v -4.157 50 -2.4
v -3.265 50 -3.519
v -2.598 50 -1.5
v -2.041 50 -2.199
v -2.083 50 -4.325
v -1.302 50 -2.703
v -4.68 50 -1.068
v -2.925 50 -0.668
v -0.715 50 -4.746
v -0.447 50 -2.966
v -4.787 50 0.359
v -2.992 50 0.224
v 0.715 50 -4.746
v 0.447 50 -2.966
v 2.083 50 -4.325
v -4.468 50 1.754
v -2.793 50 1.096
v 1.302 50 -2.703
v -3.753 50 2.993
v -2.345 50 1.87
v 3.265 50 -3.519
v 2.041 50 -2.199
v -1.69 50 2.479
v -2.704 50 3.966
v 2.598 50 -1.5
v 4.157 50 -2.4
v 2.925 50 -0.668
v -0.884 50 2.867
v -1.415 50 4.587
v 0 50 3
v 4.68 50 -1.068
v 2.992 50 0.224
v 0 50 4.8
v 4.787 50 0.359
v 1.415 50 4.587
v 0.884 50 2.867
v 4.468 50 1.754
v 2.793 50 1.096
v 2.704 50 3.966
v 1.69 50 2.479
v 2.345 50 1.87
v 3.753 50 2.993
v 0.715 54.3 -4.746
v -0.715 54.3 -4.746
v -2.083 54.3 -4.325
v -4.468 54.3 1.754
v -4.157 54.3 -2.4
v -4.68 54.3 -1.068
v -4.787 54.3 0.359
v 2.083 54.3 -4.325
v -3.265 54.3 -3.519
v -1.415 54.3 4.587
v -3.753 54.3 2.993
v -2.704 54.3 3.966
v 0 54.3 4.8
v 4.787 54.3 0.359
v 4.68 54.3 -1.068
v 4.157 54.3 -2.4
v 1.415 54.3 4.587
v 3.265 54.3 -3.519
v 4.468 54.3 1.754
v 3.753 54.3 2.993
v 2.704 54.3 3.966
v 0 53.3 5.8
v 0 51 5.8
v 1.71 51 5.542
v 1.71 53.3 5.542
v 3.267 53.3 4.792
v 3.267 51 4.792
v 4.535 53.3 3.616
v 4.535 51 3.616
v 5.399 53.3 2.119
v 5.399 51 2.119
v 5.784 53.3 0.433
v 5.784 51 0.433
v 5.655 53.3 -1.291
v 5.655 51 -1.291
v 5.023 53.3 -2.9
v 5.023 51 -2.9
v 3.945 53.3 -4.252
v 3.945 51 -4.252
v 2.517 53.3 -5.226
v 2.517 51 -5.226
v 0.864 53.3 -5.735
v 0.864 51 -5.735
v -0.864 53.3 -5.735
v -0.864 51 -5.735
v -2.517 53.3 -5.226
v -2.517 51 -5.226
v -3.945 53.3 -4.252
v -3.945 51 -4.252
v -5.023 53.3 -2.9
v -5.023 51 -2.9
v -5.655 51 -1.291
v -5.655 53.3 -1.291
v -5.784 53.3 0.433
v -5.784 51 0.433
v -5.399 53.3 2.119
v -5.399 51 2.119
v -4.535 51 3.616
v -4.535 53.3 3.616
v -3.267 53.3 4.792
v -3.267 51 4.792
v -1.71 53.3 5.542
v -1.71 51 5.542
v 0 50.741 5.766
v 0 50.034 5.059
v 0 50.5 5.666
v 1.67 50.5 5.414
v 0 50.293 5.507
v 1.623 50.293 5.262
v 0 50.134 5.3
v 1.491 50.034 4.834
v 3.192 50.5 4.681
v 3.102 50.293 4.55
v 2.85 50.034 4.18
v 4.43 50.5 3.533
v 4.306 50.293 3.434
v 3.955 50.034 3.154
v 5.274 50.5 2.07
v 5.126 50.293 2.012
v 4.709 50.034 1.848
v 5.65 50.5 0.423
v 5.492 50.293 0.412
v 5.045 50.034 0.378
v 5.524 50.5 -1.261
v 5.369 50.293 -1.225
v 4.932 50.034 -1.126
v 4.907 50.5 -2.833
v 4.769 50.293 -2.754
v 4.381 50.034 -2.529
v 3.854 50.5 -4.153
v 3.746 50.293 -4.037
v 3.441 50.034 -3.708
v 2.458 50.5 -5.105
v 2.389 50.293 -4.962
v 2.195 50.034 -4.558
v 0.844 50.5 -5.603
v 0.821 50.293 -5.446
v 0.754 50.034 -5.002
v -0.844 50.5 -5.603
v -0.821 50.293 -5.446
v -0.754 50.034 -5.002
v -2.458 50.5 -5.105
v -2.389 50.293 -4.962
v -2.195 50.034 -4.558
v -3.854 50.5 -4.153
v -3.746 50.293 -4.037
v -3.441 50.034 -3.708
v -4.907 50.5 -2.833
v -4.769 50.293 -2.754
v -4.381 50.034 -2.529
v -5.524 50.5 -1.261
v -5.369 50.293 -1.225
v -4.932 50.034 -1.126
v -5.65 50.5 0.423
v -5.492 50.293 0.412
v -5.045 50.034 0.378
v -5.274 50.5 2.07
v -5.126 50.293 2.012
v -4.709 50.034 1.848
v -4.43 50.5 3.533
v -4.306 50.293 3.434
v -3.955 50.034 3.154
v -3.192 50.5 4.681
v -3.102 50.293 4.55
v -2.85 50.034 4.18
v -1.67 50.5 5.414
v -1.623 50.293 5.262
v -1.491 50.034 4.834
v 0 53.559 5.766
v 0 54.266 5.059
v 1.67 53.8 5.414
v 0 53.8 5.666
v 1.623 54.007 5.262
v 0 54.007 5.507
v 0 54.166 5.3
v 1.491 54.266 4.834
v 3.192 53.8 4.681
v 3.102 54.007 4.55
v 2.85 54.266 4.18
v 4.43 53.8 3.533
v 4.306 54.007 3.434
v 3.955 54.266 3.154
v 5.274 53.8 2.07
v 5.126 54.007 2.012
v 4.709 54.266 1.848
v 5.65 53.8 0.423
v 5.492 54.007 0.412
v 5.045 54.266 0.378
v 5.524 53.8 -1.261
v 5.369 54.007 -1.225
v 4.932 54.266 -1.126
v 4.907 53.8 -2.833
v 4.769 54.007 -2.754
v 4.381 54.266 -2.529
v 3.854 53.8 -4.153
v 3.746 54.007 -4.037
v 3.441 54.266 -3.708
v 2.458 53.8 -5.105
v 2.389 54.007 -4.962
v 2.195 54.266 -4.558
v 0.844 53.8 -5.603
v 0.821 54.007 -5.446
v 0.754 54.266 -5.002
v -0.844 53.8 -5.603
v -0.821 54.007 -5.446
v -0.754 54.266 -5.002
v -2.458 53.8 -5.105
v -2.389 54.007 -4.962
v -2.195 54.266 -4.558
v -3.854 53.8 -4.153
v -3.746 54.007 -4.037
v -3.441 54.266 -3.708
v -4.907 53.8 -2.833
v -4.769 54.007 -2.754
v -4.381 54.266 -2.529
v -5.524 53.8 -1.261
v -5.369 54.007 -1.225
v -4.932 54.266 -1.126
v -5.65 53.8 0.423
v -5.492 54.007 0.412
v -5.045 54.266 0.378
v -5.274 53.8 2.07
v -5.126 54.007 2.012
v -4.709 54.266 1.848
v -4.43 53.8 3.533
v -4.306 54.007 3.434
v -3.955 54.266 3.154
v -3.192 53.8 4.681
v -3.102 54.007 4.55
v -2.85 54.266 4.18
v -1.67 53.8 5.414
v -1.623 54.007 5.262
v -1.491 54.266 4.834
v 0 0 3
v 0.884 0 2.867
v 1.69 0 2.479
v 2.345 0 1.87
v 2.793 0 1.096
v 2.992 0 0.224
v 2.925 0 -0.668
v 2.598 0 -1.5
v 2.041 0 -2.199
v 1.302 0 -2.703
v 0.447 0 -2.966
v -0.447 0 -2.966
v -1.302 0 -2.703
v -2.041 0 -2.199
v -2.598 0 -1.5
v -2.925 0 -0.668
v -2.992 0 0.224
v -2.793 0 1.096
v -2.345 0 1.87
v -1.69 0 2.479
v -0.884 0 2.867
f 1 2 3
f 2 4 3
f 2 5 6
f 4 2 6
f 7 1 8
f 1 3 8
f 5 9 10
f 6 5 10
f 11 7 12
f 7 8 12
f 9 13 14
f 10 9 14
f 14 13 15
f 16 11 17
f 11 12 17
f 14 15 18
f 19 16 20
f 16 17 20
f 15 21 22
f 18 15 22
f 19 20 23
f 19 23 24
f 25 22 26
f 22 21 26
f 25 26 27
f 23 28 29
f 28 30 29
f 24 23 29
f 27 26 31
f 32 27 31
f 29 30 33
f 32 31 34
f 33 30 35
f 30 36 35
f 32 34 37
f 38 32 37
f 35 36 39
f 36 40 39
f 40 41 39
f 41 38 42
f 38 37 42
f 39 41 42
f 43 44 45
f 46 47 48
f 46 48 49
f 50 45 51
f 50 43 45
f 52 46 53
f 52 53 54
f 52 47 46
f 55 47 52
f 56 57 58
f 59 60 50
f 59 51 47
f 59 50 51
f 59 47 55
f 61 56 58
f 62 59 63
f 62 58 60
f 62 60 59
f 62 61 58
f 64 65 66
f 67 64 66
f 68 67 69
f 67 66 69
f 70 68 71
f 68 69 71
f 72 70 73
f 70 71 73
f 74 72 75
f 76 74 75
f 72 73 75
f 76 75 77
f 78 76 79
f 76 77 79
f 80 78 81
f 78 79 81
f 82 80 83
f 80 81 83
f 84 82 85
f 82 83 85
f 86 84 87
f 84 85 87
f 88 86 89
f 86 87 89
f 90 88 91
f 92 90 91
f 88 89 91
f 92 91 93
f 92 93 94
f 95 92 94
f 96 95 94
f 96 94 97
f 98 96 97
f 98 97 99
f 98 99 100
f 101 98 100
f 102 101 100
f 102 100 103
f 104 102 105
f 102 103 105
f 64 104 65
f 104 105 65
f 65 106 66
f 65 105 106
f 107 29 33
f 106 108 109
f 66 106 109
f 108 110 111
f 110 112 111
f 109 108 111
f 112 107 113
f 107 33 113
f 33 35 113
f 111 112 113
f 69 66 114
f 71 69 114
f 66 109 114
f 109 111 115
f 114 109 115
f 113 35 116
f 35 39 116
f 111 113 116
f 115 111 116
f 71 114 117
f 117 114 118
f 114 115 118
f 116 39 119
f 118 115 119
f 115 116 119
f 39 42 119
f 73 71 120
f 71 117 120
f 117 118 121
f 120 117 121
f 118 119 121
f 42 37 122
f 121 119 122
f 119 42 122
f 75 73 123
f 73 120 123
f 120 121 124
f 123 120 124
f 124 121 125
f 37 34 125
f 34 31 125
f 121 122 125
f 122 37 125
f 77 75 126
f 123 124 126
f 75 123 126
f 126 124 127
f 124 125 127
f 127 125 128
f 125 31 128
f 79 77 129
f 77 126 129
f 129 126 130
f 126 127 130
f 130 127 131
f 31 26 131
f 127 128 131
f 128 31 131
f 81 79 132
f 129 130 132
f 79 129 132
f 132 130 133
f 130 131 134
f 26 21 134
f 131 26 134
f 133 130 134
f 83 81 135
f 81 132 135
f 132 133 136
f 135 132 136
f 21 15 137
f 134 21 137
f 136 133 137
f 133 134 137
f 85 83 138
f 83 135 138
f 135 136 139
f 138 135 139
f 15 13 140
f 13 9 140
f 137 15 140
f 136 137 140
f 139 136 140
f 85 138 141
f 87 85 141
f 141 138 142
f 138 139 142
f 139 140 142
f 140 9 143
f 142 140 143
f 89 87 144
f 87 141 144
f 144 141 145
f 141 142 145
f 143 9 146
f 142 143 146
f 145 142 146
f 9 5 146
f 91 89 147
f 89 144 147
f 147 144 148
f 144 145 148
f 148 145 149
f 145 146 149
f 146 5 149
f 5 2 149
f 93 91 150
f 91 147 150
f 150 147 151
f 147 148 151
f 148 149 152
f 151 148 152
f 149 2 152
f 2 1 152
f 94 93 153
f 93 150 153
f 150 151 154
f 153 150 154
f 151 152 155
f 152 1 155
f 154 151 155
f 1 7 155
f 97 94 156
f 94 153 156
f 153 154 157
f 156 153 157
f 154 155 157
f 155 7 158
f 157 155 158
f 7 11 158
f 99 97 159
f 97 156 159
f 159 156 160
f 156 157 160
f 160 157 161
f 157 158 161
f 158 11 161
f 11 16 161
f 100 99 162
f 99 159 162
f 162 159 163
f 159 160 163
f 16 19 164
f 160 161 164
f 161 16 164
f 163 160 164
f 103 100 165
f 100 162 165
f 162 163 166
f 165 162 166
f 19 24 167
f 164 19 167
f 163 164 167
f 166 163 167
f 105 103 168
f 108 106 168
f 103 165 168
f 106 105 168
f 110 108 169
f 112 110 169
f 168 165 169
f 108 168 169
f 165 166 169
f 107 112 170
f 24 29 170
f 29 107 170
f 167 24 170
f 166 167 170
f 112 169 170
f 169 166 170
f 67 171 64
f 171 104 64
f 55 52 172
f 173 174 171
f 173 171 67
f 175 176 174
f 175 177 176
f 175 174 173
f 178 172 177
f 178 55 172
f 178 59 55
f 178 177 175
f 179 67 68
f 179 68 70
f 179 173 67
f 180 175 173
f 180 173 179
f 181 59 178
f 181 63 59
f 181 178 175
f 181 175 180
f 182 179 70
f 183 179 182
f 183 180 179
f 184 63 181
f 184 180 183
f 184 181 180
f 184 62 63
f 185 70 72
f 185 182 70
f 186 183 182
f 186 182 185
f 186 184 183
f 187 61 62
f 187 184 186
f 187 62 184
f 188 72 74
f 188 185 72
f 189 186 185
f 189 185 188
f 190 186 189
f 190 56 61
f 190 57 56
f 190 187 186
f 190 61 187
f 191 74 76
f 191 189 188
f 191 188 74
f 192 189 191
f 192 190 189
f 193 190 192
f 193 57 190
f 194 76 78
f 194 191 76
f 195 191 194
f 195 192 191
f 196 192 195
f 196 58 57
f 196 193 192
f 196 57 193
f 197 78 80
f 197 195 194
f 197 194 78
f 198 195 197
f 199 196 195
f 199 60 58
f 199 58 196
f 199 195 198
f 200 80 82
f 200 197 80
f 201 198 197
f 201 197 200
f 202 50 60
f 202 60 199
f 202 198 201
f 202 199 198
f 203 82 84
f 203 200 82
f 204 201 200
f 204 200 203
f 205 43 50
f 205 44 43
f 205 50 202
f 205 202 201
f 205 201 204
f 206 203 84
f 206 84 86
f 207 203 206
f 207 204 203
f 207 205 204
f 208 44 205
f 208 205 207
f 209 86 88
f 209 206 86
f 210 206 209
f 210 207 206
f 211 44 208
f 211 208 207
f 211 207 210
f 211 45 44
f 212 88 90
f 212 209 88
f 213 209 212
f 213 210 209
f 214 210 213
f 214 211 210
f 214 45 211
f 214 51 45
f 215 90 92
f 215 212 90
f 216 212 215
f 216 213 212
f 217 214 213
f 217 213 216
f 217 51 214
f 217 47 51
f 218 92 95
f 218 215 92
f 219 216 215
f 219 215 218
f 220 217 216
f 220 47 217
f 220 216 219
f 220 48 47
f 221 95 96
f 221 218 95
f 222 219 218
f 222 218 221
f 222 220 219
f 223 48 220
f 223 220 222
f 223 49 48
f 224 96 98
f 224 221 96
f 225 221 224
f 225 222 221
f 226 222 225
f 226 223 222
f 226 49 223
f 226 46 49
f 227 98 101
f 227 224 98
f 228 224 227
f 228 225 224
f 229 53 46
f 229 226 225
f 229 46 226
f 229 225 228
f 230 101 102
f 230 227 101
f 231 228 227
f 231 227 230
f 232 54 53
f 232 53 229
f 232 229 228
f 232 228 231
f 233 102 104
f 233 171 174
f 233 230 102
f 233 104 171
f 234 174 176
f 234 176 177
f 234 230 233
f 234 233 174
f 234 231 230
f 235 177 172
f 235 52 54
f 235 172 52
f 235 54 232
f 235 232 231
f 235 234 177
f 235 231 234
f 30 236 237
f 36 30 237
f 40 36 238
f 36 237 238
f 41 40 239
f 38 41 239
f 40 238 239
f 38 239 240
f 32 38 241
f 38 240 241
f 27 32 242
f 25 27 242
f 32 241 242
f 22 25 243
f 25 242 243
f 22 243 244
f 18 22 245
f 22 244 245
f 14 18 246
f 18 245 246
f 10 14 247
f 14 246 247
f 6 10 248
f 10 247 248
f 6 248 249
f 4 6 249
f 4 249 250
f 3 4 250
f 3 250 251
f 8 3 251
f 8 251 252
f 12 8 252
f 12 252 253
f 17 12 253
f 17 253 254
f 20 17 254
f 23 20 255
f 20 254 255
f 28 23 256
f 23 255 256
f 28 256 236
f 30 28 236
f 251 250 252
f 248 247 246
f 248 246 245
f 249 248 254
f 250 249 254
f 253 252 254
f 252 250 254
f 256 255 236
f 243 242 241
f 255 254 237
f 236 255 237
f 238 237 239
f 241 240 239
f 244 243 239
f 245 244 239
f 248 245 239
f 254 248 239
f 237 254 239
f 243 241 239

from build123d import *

# Parameters (mm, degrees)
SKETCH1_R           = 3
BOSS_EXTRUDE1_DEPTH = 50
SKETCH2_R           = 5.8
BOSS_EXTRUDE2_DEPTH = 4.3
FILLET1_R           = 1


with BuildPart() as part:
    # Sketch1 → Boss-Extrude1 (new body)
    with BuildSketch(Plane(origin=(0, 0, 0), x_dir=(1, 0, 0), z_dir=(0, 1, 0))):
        with Locations(Location((0, 0, 0), (0, 0, 270))):  # turned: the seam where the file's is
            Circle(SKETCH1_R)
    extrude(amount=BOSS_EXTRUDE1_DEPTH)

    # Sketch2 → Boss-Extrude2 (add)
    with BuildSketch(Plane(origin=(0, 50, 0), x_dir=(1, 0, 0), z_dir=(0, 1, 0))):
        with Locations(Location((0, 0, 0), (0, 0, 270))):  # turned: the seam where the file's is
            Circle(SKETCH2_R)
    extrude(amount=BOSS_EXTRUDE2_DEPTH)

    # Fillet1
    fillet1_edges = [part.edges().sort_by_distance(p)[0] for p in [
        (0, 50, -5.8),
        (0, 54.3, -5.8),
    ]]
    fillet(fillet1_edges, radius=FILLET1_R)


solid = part.part
